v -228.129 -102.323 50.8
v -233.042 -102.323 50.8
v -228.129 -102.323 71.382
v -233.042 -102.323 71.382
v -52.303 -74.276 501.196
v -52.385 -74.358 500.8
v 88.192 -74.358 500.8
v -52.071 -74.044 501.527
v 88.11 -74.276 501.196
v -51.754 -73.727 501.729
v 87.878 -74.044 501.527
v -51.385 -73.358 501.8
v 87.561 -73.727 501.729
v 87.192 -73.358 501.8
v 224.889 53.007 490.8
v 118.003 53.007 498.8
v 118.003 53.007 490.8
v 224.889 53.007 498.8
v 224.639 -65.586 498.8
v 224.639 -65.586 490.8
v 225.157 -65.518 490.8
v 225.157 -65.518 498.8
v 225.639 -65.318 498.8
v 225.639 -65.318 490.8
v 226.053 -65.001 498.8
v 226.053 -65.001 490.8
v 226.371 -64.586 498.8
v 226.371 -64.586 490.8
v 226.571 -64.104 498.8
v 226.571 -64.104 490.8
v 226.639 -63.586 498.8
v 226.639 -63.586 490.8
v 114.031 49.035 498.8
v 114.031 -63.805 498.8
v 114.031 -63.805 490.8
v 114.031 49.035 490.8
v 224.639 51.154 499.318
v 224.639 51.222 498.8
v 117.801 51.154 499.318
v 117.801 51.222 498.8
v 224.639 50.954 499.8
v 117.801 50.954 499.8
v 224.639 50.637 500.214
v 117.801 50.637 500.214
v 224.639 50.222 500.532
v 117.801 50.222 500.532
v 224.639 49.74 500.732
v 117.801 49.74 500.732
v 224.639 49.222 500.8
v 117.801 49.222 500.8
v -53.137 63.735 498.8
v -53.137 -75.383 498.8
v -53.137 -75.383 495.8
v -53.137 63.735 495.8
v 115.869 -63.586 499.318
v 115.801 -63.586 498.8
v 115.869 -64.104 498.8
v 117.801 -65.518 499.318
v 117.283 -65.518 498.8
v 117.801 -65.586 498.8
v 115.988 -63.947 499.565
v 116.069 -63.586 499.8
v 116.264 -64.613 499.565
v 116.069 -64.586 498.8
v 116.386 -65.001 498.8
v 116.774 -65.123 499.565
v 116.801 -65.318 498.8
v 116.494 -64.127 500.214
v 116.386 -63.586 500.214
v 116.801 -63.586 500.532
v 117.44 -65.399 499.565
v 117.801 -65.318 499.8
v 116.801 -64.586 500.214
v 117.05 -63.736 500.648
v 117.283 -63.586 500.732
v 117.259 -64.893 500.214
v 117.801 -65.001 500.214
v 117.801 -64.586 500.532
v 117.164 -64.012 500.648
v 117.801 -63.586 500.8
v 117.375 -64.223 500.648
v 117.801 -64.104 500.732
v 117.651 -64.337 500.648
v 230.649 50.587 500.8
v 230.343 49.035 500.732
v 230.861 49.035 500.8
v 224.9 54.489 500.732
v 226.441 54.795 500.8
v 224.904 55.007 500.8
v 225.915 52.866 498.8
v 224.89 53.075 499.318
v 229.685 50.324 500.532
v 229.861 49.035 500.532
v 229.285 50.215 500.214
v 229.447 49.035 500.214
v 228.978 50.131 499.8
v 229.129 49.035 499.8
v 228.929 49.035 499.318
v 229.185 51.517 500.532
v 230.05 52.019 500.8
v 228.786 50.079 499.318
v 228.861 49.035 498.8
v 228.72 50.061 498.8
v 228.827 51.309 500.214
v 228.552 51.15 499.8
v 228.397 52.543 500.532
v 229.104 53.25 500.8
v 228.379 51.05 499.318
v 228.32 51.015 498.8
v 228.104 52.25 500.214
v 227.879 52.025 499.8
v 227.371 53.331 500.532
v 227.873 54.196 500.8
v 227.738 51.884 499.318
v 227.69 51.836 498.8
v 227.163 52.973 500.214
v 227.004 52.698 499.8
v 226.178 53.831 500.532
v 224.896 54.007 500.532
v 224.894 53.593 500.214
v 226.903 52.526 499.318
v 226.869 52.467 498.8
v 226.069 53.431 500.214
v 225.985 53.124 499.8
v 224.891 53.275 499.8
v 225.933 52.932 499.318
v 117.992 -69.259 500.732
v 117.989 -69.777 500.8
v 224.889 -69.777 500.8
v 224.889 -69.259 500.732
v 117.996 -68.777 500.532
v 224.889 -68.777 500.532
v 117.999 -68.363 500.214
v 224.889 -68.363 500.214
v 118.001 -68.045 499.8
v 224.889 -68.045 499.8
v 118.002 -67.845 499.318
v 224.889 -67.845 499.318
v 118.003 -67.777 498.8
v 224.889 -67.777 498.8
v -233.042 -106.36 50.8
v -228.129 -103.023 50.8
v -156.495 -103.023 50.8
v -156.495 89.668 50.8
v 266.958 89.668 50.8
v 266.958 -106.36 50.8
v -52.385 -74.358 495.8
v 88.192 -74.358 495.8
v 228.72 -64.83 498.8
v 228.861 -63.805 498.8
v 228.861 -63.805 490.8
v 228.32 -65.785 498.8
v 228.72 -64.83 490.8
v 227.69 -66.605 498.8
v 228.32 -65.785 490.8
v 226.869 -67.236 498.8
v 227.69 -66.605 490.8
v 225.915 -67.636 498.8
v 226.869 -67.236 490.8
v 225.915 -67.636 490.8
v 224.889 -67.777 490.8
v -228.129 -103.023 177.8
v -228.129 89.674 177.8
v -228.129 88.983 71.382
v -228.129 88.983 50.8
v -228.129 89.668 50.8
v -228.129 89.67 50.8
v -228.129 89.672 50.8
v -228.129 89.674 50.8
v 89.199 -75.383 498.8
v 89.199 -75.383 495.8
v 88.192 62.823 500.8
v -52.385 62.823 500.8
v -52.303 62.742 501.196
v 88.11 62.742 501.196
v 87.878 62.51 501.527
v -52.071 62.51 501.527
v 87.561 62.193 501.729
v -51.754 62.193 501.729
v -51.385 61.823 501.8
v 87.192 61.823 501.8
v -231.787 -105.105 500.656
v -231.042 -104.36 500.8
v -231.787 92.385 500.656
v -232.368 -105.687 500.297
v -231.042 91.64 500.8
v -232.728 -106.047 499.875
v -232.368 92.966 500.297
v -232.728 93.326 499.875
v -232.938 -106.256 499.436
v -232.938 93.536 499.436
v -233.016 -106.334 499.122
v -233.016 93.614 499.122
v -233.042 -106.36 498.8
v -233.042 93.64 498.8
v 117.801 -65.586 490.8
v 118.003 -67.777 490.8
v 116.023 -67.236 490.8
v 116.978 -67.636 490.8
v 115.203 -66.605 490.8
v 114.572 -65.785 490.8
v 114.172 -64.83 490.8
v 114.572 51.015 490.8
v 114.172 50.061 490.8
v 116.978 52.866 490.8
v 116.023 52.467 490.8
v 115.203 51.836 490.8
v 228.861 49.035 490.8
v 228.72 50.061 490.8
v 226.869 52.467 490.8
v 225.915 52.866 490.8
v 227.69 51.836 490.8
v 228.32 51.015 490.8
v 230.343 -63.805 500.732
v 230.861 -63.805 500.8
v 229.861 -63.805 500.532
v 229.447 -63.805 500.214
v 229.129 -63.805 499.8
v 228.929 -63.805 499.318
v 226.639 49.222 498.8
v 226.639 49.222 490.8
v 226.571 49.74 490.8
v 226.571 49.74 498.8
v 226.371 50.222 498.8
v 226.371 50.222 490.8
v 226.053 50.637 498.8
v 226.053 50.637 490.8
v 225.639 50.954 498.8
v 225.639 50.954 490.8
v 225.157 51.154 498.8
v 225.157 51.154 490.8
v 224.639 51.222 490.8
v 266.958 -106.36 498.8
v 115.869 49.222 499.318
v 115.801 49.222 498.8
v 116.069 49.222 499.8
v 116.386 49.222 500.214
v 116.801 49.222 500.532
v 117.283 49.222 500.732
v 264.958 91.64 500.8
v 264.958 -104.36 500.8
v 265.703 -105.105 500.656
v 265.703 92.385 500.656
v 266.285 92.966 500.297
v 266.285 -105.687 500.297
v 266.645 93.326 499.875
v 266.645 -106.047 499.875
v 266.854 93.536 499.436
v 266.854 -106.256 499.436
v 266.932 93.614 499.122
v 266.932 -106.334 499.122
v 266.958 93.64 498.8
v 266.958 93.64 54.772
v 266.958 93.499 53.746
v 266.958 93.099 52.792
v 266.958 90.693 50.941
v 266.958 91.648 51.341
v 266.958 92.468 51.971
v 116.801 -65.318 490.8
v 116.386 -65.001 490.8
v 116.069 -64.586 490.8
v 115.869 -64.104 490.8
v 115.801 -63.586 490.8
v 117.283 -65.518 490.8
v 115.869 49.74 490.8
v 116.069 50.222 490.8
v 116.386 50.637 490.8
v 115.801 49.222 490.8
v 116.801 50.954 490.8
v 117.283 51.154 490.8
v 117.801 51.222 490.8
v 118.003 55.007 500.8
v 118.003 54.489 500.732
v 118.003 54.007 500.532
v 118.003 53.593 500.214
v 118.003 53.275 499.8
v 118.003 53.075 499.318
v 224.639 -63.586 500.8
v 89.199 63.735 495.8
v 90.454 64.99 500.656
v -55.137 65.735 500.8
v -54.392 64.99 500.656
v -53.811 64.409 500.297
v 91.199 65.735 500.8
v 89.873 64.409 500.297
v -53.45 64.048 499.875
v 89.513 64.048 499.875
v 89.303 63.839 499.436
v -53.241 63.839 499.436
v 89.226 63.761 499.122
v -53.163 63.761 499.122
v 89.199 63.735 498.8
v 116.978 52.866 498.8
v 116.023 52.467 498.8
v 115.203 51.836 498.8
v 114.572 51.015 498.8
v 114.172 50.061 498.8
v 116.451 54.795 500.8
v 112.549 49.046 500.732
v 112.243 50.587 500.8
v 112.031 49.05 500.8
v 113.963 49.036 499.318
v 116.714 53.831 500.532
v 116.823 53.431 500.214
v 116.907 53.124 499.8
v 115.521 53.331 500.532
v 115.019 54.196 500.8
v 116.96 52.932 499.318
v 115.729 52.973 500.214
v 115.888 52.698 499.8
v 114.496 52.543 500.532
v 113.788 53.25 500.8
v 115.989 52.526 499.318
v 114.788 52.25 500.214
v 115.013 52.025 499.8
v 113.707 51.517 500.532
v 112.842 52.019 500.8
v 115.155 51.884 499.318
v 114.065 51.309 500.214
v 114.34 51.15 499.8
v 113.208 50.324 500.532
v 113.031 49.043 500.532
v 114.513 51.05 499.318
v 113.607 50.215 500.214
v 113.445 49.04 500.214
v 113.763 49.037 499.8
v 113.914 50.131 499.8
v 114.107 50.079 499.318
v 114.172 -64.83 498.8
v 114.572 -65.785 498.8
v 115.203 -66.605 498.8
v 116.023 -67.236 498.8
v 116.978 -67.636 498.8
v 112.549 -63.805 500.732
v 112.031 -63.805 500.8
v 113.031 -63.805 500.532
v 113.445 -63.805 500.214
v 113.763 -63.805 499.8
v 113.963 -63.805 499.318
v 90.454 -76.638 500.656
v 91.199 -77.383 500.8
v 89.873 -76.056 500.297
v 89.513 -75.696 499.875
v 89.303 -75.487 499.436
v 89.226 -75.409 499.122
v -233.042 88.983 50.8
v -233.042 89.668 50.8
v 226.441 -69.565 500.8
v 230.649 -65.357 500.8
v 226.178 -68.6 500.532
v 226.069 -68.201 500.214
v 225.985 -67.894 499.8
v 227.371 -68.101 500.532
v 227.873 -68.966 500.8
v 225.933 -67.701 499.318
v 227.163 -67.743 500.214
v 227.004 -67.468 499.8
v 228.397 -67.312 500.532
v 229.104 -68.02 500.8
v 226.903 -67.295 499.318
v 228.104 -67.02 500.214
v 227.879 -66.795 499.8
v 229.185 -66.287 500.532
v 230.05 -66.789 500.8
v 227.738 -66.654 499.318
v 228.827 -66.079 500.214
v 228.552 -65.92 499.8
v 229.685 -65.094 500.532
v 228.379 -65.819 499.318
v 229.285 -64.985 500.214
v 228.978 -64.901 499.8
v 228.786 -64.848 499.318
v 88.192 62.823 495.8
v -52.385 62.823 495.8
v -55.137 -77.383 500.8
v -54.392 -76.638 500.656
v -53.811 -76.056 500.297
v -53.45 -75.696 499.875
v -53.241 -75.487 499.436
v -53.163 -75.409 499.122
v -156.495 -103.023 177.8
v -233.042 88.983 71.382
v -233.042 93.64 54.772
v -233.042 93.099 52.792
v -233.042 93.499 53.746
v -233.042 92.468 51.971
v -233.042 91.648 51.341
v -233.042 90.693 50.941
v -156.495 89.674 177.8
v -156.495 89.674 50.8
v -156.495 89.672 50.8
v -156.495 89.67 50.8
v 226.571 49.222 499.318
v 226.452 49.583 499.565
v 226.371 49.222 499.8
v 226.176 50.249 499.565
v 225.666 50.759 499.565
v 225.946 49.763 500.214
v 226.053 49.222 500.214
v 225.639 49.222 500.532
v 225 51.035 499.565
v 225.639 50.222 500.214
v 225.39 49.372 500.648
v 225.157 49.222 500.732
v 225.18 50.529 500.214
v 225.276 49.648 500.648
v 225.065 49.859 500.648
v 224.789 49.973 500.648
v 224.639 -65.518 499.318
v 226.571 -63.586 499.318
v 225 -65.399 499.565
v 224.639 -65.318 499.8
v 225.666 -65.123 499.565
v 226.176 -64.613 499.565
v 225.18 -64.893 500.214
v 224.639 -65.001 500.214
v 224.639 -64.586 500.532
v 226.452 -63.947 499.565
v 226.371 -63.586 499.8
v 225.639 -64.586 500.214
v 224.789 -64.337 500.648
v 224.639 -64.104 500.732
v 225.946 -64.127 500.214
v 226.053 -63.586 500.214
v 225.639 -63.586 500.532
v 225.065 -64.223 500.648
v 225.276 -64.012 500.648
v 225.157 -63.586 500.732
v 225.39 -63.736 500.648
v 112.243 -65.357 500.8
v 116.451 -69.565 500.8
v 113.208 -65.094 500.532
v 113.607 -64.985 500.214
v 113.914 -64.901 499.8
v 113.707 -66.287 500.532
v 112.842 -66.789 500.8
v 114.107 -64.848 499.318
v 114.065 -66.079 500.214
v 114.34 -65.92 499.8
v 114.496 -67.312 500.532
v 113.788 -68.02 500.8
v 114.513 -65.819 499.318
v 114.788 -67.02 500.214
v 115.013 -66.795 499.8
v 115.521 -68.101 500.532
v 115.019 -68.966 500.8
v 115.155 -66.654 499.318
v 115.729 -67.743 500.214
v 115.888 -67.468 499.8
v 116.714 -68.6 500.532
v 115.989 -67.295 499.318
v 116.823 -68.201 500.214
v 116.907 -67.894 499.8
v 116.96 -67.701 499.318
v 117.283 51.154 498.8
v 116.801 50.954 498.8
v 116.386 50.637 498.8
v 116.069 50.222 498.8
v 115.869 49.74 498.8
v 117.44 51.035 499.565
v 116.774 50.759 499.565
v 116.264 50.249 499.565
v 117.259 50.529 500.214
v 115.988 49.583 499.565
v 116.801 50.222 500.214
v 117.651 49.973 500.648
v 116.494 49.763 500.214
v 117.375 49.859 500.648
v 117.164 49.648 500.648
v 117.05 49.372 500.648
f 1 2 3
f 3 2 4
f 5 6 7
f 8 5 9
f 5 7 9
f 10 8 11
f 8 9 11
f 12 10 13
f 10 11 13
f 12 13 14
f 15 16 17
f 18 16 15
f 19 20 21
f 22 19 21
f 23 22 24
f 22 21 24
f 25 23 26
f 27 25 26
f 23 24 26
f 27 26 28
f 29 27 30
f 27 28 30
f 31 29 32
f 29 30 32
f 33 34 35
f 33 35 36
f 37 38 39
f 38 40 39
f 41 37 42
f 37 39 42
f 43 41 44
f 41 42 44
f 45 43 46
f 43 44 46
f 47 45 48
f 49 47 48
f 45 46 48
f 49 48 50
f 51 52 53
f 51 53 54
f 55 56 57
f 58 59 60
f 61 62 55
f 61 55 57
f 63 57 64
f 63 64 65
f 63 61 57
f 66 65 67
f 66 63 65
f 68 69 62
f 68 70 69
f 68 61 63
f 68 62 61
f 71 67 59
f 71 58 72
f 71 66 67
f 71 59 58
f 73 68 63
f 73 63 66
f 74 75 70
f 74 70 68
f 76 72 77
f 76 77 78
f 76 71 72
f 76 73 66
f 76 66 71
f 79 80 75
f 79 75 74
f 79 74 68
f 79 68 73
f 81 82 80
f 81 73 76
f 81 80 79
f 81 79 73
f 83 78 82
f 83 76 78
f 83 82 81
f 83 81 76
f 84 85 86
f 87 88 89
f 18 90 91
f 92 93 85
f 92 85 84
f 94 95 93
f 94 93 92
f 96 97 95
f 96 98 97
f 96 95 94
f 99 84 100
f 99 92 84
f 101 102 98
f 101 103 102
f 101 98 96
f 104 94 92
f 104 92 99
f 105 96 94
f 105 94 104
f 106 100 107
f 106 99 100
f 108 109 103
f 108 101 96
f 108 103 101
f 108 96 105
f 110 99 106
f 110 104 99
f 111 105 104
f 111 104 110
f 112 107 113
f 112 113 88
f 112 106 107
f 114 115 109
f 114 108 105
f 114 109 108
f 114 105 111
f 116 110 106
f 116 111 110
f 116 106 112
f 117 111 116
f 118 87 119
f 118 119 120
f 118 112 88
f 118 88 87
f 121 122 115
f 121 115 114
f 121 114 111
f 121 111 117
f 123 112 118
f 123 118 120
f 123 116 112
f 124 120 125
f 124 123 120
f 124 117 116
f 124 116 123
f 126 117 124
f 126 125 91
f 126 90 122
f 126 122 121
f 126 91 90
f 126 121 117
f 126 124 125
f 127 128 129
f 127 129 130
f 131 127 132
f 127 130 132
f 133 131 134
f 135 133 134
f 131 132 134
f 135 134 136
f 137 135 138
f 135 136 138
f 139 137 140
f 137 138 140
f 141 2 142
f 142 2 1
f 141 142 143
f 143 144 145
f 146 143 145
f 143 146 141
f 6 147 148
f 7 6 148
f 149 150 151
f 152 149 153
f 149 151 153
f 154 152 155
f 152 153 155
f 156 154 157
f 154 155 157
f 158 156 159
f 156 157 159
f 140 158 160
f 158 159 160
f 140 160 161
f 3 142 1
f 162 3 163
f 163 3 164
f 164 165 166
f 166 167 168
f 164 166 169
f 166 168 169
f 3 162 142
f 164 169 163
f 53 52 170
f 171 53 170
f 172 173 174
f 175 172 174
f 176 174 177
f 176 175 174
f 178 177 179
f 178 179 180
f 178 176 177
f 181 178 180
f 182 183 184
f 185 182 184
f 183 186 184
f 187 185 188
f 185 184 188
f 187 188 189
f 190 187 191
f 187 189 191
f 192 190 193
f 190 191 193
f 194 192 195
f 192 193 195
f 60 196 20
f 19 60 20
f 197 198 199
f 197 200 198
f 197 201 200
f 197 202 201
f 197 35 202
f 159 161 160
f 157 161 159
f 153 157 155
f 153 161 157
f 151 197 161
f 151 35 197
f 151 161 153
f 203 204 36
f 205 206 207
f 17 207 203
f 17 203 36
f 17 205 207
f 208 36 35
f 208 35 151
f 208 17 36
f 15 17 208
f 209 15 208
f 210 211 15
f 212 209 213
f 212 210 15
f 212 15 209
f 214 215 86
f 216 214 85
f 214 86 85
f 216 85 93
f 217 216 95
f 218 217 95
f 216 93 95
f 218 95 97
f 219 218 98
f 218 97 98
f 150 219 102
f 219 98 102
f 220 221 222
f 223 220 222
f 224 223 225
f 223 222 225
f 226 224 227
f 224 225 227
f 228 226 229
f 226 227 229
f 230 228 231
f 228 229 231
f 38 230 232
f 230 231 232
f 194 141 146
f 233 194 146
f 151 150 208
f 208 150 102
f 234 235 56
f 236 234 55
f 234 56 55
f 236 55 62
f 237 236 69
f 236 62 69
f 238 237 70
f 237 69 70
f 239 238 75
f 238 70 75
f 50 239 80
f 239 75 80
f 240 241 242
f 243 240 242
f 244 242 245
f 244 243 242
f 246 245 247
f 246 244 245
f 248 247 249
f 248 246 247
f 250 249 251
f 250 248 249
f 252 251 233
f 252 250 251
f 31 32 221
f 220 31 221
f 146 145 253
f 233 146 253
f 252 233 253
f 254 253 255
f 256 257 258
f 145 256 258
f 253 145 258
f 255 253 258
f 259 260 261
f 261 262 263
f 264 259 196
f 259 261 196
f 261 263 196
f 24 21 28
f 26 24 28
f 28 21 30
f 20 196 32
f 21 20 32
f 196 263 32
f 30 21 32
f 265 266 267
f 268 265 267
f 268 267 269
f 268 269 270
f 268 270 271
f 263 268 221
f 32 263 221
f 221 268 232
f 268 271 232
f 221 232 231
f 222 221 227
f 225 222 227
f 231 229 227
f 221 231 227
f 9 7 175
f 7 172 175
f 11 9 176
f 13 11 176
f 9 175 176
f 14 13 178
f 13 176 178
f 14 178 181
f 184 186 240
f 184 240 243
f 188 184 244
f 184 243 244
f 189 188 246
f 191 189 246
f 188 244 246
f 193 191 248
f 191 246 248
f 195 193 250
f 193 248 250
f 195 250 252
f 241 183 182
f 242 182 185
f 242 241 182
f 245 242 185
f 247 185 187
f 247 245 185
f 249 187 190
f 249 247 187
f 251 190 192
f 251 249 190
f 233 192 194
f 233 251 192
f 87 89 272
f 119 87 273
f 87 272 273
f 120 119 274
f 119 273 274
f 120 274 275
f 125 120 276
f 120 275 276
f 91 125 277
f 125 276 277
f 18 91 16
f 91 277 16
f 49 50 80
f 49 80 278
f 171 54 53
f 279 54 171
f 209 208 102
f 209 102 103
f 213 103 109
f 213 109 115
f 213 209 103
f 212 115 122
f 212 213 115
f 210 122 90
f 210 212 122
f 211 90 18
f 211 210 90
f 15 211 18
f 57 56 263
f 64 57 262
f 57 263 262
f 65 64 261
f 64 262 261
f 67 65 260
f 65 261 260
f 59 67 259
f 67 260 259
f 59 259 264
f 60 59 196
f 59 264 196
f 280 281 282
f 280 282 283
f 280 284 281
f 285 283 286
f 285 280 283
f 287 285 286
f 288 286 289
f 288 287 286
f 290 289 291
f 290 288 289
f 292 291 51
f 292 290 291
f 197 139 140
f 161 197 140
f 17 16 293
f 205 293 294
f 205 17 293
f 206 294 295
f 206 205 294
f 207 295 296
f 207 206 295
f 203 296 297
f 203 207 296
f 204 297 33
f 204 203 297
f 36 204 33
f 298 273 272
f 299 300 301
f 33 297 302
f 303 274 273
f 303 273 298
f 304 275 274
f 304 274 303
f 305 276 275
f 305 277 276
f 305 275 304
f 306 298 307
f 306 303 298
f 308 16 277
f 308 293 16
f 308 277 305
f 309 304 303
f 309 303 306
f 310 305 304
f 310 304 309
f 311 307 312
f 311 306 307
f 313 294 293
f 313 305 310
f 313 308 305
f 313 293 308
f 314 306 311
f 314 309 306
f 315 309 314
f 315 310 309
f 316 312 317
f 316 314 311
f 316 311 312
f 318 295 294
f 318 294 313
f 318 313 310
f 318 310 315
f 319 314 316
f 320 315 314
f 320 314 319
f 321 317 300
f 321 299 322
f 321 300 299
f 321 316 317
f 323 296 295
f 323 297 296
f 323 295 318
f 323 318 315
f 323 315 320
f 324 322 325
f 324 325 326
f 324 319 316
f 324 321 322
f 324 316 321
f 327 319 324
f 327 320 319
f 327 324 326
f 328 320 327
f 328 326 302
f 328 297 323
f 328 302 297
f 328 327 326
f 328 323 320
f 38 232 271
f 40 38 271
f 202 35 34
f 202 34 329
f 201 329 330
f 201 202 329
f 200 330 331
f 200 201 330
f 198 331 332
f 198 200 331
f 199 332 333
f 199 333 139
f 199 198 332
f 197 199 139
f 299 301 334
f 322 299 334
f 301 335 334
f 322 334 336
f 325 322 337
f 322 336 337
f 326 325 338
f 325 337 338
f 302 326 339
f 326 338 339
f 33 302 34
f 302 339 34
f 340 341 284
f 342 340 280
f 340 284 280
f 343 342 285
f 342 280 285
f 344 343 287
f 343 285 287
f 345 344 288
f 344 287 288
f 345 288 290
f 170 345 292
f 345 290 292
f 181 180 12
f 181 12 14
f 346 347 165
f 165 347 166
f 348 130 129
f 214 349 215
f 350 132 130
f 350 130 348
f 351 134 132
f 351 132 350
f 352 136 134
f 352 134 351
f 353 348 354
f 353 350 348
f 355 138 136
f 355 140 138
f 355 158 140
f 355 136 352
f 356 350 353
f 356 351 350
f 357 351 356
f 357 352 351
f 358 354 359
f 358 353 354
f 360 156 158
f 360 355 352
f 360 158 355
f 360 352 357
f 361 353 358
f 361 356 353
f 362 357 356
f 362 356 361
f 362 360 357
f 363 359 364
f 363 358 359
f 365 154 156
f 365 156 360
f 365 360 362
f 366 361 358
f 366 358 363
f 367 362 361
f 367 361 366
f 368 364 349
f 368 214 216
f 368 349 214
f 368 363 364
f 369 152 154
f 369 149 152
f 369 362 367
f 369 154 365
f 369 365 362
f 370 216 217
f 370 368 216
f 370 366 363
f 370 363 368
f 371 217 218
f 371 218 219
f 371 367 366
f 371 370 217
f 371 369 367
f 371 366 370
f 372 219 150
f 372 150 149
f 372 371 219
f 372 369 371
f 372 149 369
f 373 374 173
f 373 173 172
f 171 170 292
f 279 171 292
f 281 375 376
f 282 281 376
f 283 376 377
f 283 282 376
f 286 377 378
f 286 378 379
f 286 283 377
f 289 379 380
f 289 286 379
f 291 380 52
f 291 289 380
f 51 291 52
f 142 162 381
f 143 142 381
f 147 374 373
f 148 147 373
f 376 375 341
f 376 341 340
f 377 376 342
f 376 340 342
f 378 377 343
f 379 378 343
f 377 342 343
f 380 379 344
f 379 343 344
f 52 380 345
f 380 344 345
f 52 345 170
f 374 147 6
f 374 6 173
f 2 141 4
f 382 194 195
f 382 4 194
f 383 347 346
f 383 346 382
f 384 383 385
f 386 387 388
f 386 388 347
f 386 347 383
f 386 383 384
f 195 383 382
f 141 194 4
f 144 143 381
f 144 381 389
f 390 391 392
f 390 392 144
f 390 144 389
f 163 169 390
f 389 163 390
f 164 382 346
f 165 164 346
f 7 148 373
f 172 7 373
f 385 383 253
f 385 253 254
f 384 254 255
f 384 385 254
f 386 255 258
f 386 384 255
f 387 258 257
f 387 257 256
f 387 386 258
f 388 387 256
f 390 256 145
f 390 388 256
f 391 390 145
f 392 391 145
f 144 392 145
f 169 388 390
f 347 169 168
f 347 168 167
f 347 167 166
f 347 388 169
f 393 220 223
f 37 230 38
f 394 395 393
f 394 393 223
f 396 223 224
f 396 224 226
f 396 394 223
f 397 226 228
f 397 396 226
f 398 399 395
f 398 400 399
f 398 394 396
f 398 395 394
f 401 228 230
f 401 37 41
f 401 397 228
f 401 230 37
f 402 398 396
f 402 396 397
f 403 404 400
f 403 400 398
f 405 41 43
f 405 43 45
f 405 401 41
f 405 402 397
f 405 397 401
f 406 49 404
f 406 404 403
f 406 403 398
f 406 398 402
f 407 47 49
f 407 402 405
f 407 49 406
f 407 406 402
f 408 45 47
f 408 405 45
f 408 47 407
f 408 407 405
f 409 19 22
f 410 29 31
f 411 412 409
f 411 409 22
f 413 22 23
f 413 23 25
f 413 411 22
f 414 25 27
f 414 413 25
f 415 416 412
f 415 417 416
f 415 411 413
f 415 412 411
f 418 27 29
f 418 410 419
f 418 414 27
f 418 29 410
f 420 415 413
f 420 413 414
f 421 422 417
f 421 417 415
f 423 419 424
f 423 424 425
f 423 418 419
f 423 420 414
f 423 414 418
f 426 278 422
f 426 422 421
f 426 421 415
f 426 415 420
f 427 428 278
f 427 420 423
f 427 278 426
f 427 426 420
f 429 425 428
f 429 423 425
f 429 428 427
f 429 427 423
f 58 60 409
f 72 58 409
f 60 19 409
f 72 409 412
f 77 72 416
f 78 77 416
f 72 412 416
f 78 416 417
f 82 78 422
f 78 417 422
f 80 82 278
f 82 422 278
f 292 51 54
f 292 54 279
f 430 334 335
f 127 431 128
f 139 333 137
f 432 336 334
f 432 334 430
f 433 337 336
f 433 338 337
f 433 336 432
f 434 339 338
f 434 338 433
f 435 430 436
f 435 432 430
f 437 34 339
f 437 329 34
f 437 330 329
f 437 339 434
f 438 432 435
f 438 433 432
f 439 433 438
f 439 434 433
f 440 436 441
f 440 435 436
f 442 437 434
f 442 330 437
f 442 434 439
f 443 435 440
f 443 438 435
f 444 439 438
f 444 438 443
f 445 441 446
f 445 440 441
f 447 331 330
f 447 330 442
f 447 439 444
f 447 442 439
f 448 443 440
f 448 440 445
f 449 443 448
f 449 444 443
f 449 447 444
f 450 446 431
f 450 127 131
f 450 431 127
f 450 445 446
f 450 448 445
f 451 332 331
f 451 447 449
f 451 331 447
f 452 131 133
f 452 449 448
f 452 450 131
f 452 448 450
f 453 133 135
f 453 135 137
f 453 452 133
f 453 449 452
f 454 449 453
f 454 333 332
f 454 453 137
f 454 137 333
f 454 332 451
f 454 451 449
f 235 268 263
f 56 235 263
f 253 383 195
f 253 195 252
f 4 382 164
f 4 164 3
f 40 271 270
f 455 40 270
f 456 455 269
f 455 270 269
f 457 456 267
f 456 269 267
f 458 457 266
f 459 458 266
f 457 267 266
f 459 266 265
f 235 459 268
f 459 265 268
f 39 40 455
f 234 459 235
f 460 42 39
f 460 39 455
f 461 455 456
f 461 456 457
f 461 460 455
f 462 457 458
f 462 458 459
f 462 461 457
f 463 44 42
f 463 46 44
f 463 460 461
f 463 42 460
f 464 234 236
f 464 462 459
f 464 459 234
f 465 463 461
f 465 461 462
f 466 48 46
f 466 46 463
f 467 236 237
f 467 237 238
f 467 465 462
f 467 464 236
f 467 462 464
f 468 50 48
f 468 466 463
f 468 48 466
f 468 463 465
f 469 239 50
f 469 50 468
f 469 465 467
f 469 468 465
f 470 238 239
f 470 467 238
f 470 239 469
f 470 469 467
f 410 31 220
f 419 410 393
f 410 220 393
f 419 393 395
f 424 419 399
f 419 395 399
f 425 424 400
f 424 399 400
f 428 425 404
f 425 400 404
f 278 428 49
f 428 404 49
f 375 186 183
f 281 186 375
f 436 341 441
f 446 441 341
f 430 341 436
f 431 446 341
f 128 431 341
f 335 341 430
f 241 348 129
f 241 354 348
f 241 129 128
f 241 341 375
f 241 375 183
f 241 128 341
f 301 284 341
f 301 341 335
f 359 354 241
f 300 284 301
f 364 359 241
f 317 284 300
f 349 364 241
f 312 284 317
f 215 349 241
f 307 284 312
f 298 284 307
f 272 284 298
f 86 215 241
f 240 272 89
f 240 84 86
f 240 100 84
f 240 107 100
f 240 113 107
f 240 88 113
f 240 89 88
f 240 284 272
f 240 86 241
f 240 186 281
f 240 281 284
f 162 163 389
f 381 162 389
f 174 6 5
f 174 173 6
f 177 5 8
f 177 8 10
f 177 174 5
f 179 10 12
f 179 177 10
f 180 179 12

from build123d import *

# Parameters (mm, degrees)
F1_W        = 500
F1_H        = 200
F2_DEPTH    = 450
F3_W        = 114.8297786713
F3_H        = 120.7839138806
F4_DEPTH    = 10
F5_T1_DEPTH = 19.9997500031
F5_T3_DEPTH = 519.9995000063
F7_DEPTH    = 10
F8_R        = 2
F9_W        = 142.3365101218
F9_H        = 139.1178444028
F10_DEPTH   = 5
F11_W       = 140.5770033598
F11_H       = 137.1815949678
F12_DEPTH   = 6
F13_R       = 1
F14_R       = 2
F15_W       = 71.6344714165
F15_H       = 192.6967278123
F16_DEPTH   = 127
F17_W       = 191.3057491183
F17_H       = 2.1015560806
F17_H_2     = 20.5821128011
F18_DEPTH   = 76.5471703


# Not quite as in the source:
# - a fillet or chamfer that OpenCascade refuses, or shapes differently, is made with other operations: its cross-section is extruded or revolved along the edge and cut away or added
# - an extrude ends at something that could not be found from the text; its depth is read off the source's solid


with BuildPart() as f2:
    # F1 (on offset) → F2 (new body)
    with BuildSketch(Plane.XY.offset(50.8)):
        with Locations((16.9582420111, -6.3602398952)):
            Rectangle(F1_W, F1_H)
    extrude(amount=F2_DEPTH)

    # F3 (on face) → F4 (cut)
    with BuildSketch(Plane.XY.offset(500.8)):
        with Locations((171.4461296797, -7.3848497123)):
            Rectangle(F3_W, F3_H)
    extrude(amount=-F4_DEPTH, mode=Mode.SUBTRACT)

    # F5: fillet of radius 4 on 5 edges, made by hand

    # F5_s2 → F5_t1 (join)
    with BuildSketch(Plane.XY.offset(480.8002499969)):
        with BuildLine():
            ThreePointArc((228.8611190153, 49.007207228), (227.6895461401, 51.8356343528), (224.8611190153, 53.007207228))
            Line((224.8611190153, 53.007207228), (224.8611190153, 53.087207228))
            ThreePointArc((224.8611190153, 53.087207228), (226.8610690153, 53.087107228), (228.8610190153, 53.087107228))
            Line((228.8610190153, 53.087107228), (228.9410190153, 53.007107228))
            ThreePointArc((228.9410190153, 53.007107228), (228.9410190153, 51.007157228), (228.9411190153, 49.007207228))
            Line((228.9411190153, 49.007207228), (228.8611190153, 49.007207228))
        make_face()
        with BuildLine():
            ThreePointArc((228.8611190153, -63.7769066525), (227.6895461401, -66.6053337773), (224.8611190153, -67.7769066525))
            Line((224.8611190153, -67.7769066525), (224.8611190153, -67.8569066525))
            ThreePointArc((224.8611190153, -67.8569066525), (226.8610690153, -67.8568066525), (228.8610190153, -67.8568066525))
            Line((228.8610190153, -67.8568066525), (228.9410190153, -67.7768066525))
            ThreePointArc((228.9410190153, -67.7768066525), (228.9410190153, -65.7768566525), (228.9411190153, -63.7769066525))
            Line((228.9411190153, -63.7769066525), (228.8611190153, -63.7769066525))
        make_face()
        with BuildLine():
            ThreePointArc((118.031140344, 53.007207228), (115.2027132193, 51.8356343528), (114.031140344, 49.007207228))
            Line((114.031140344, 49.007207228), (113.951140344, 49.007207228))
            ThreePointArc((113.951140344, 49.007207228), (113.951240344, 51.007157228), (113.951240344, 53.007107228))
            Line((113.951240344, 53.007107228), (114.031240344, 53.087107228))
            ThreePointArc((114.031240344, 53.087107228), (116.031190344, 53.087107228), (118.031140344, 53.087207228))
            Line((118.031140344, 53.087207228), (118.031140344, 53.007207228))
        make_face()
        with BuildLine():
            ThreePointArc((114.031140344, -63.7769066525), (115.2027132193, -66.6053337773), (118.031140344, -67.7769066525))
            Line((118.031140344, -67.7769066525), (118.031140344, -67.8569066525))
            ThreePointArc((118.031140344, -67.8569066525), (116.031190344, -67.8568066525), (114.031240344, -67.8568066525))
            Line((114.031240344, -67.8568066525), (113.951240344, -67.7768066525))
            ThreePointArc((113.951240344, -67.7768066525), (113.951240344, -65.7768566525), (113.951140344, -63.7769066525))
            Line((113.951140344, -63.7769066525), (114.031140344, -63.7769066525))
        make_face()
    extrude(amount=F5_T1_DEPTH)

    # F5_s4 → F5_t3 (cut)
    with BuildSketch(Plane.YZ.offset(-243.0415079921)):
        with BuildLine():
            ThreePointArc((93.6398601048, 54.7999), (92.4682872295, 51.9714728753), (89.6398601048, 50.7999))
            Line((89.6398601048, 50.7999), (89.6398601048, 50.7199))
            ThreePointArc((89.6398601048, 50.7199), (91.6398101048, 50.72), (93.6397601048, 50.72))
            Line((93.6397601048, 50.72), (93.7197601048, 50.8))
            ThreePointArc((93.7197601048, 50.8), (93.7197601048, 52.79995), (93.7198601048, 54.7999))
            Line((93.7198601048, 54.7999), (93.6398601048, 54.7999))
        make_face()
    extrude(amount=F5_T3_DEPTH, mode=Mode.SUBTRACT)

    # F9 (on face) → F10 (cut)
    with BuildSketch(Plane.XY.offset(500.8)):
        with Locations((18.0311240256, -5.8237947524)):
            Rectangle(F9_W, F9_H)
    extrude(amount=-F10_DEPTH, mode=Mode.SUBTRACT)

    # F14
    f14_edges = [f2.edges().sort_by_distance(p)[0] for p in [
        (266.958242, -6.36024, 500.8),
        (16.958242, -106.36024, 500.8),
        (16.958242, 93.63976, 500.8),
        (-233.041758, -6.36024, 500.8),
        (228.861019, -7.38485, 500.8),
        (227.689546, -66.605334, 500.8),
        (227.689546, 51.835634, 500.8),
        (171.44613, -67.776807, 500.8),
        (171.44613, 53.007107, 500.8),
        (115.202713, -66.605334, 500.8),
        (115.202713, 51.835634, 500.8),
        (114.03124, -7.38485, 500.8),
        (89.199379, -5.823795, 500.8),
        (18.031124, 63.735127, 500.8),
        (-53.137131, -5.823795, 500.8),
        (18.031124, -75.382717, 500.8),
    ]]
    fillet(f14_edges, radius=F14_R)

    # F15 (on face) → F16 (cut)
    with BuildSketch(Plane.XY.offset(50.8)):
        with Locations((-192.3118233681, -6.6746808589)):
            Rectangle(F15_W, F15_H)
    extrude(amount=F16_DEPTH, mode=Mode.SUBTRACT)

    # F17 (on face) → F18 (cut, through all)
    with BuildSketch(Plane(origin=(-233.0417579889, 0, 0), x_dir=(0, -1, 0), z_dir=(-1, 0, 0))):
        with Locations((6.6700465977, 49.7492219597)):
            Rectangle(F17_W, F17_H)
        with Locations((6.6700465977, 61.0910564005)):
            Rectangle(F17_W, F17_H_2)
    extrude(amount=-F18_DEPTH, mode=Mode.SUBTRACT)


with BuildPart() as f7:
    # F6 (on face) → F7 (new body)
    with BuildSketch(Plane.XY.offset(490.8)):
        with BuildLine():
            Line((224.6392856836, 51.2222974241), (117.8006191254, 51.2222974241))
            ThreePointArc((117.8006191254, 51.2222974241), (116.386405563, 50.6365109865), (115.8006191254, 49.2222974241))
            Line((115.8006191254, 49.2222974241), (115.8006191254, -63.5862987041))
            ThreePointArc((115.8006191254, -63.5862987041), (116.386405563, -65.0005122665), (117.8006191254, -65.5862987041))
            Line((117.8006191254, -65.5862987041), (224.6392856836, -65.5862987041))
            ThreePointArc((224.6392856836, -65.5862987041), (226.053499246, -65.0005122665), (226.6392856836, -63.5862987041))
            Line((226.6392856836, -63.5862987041), (226.6392856836, 49.2222974241))
            ThreePointArc((226.6392856836, 49.2222974241), (226.053499246, 50.6365109865), (224.6392856836, 51.2222974241))
        make_face()
    extrude(amount=F7_DEPTH)

    # F8
    f8_edges = [f7.edges().sort_by_distance(p)[0] for p in [
        (171.219952, 51.222297, 500.8),
        (116.386406, 50.636511, 500.8),
        (115.800619, -7.182001, 500.8),
        (116.386406, -65.000512, 500.8),
        (171.219952, -65.586299, 500.8),
        (226.053499, -65.000512, 500.8),
        (226.639286, -7.182001, 500.8),
        (226.053499, 50.636511, 500.8),
    ]]
    fillet(f8_edges, radius=F8_R)


with BuildPart() as f12:
    # F11 (on face) → F12 (new body)
    with BuildSketch(Plane.XY.offset(495.8)):
        with Locations((17.9034695029, -5.767442286)):
            Rectangle(F11_W, F11_H)
    extrude(amount=F12_DEPTH)

    # F13
    f13_edges = [f12.edges().sort_by_distance(p)[0] for p in [
        (17.90347, 62.823355, 501.8),
        (-52.385032, -5.767442, 501.8),
        (17.90347, -74.35824, 501.8),
        (88.191971, -5.767442, 501.8),
    ]]
    fillet(f13_edges, radius=F13_R)


solid = Compound([f2.part, f7.part, f12.part])
